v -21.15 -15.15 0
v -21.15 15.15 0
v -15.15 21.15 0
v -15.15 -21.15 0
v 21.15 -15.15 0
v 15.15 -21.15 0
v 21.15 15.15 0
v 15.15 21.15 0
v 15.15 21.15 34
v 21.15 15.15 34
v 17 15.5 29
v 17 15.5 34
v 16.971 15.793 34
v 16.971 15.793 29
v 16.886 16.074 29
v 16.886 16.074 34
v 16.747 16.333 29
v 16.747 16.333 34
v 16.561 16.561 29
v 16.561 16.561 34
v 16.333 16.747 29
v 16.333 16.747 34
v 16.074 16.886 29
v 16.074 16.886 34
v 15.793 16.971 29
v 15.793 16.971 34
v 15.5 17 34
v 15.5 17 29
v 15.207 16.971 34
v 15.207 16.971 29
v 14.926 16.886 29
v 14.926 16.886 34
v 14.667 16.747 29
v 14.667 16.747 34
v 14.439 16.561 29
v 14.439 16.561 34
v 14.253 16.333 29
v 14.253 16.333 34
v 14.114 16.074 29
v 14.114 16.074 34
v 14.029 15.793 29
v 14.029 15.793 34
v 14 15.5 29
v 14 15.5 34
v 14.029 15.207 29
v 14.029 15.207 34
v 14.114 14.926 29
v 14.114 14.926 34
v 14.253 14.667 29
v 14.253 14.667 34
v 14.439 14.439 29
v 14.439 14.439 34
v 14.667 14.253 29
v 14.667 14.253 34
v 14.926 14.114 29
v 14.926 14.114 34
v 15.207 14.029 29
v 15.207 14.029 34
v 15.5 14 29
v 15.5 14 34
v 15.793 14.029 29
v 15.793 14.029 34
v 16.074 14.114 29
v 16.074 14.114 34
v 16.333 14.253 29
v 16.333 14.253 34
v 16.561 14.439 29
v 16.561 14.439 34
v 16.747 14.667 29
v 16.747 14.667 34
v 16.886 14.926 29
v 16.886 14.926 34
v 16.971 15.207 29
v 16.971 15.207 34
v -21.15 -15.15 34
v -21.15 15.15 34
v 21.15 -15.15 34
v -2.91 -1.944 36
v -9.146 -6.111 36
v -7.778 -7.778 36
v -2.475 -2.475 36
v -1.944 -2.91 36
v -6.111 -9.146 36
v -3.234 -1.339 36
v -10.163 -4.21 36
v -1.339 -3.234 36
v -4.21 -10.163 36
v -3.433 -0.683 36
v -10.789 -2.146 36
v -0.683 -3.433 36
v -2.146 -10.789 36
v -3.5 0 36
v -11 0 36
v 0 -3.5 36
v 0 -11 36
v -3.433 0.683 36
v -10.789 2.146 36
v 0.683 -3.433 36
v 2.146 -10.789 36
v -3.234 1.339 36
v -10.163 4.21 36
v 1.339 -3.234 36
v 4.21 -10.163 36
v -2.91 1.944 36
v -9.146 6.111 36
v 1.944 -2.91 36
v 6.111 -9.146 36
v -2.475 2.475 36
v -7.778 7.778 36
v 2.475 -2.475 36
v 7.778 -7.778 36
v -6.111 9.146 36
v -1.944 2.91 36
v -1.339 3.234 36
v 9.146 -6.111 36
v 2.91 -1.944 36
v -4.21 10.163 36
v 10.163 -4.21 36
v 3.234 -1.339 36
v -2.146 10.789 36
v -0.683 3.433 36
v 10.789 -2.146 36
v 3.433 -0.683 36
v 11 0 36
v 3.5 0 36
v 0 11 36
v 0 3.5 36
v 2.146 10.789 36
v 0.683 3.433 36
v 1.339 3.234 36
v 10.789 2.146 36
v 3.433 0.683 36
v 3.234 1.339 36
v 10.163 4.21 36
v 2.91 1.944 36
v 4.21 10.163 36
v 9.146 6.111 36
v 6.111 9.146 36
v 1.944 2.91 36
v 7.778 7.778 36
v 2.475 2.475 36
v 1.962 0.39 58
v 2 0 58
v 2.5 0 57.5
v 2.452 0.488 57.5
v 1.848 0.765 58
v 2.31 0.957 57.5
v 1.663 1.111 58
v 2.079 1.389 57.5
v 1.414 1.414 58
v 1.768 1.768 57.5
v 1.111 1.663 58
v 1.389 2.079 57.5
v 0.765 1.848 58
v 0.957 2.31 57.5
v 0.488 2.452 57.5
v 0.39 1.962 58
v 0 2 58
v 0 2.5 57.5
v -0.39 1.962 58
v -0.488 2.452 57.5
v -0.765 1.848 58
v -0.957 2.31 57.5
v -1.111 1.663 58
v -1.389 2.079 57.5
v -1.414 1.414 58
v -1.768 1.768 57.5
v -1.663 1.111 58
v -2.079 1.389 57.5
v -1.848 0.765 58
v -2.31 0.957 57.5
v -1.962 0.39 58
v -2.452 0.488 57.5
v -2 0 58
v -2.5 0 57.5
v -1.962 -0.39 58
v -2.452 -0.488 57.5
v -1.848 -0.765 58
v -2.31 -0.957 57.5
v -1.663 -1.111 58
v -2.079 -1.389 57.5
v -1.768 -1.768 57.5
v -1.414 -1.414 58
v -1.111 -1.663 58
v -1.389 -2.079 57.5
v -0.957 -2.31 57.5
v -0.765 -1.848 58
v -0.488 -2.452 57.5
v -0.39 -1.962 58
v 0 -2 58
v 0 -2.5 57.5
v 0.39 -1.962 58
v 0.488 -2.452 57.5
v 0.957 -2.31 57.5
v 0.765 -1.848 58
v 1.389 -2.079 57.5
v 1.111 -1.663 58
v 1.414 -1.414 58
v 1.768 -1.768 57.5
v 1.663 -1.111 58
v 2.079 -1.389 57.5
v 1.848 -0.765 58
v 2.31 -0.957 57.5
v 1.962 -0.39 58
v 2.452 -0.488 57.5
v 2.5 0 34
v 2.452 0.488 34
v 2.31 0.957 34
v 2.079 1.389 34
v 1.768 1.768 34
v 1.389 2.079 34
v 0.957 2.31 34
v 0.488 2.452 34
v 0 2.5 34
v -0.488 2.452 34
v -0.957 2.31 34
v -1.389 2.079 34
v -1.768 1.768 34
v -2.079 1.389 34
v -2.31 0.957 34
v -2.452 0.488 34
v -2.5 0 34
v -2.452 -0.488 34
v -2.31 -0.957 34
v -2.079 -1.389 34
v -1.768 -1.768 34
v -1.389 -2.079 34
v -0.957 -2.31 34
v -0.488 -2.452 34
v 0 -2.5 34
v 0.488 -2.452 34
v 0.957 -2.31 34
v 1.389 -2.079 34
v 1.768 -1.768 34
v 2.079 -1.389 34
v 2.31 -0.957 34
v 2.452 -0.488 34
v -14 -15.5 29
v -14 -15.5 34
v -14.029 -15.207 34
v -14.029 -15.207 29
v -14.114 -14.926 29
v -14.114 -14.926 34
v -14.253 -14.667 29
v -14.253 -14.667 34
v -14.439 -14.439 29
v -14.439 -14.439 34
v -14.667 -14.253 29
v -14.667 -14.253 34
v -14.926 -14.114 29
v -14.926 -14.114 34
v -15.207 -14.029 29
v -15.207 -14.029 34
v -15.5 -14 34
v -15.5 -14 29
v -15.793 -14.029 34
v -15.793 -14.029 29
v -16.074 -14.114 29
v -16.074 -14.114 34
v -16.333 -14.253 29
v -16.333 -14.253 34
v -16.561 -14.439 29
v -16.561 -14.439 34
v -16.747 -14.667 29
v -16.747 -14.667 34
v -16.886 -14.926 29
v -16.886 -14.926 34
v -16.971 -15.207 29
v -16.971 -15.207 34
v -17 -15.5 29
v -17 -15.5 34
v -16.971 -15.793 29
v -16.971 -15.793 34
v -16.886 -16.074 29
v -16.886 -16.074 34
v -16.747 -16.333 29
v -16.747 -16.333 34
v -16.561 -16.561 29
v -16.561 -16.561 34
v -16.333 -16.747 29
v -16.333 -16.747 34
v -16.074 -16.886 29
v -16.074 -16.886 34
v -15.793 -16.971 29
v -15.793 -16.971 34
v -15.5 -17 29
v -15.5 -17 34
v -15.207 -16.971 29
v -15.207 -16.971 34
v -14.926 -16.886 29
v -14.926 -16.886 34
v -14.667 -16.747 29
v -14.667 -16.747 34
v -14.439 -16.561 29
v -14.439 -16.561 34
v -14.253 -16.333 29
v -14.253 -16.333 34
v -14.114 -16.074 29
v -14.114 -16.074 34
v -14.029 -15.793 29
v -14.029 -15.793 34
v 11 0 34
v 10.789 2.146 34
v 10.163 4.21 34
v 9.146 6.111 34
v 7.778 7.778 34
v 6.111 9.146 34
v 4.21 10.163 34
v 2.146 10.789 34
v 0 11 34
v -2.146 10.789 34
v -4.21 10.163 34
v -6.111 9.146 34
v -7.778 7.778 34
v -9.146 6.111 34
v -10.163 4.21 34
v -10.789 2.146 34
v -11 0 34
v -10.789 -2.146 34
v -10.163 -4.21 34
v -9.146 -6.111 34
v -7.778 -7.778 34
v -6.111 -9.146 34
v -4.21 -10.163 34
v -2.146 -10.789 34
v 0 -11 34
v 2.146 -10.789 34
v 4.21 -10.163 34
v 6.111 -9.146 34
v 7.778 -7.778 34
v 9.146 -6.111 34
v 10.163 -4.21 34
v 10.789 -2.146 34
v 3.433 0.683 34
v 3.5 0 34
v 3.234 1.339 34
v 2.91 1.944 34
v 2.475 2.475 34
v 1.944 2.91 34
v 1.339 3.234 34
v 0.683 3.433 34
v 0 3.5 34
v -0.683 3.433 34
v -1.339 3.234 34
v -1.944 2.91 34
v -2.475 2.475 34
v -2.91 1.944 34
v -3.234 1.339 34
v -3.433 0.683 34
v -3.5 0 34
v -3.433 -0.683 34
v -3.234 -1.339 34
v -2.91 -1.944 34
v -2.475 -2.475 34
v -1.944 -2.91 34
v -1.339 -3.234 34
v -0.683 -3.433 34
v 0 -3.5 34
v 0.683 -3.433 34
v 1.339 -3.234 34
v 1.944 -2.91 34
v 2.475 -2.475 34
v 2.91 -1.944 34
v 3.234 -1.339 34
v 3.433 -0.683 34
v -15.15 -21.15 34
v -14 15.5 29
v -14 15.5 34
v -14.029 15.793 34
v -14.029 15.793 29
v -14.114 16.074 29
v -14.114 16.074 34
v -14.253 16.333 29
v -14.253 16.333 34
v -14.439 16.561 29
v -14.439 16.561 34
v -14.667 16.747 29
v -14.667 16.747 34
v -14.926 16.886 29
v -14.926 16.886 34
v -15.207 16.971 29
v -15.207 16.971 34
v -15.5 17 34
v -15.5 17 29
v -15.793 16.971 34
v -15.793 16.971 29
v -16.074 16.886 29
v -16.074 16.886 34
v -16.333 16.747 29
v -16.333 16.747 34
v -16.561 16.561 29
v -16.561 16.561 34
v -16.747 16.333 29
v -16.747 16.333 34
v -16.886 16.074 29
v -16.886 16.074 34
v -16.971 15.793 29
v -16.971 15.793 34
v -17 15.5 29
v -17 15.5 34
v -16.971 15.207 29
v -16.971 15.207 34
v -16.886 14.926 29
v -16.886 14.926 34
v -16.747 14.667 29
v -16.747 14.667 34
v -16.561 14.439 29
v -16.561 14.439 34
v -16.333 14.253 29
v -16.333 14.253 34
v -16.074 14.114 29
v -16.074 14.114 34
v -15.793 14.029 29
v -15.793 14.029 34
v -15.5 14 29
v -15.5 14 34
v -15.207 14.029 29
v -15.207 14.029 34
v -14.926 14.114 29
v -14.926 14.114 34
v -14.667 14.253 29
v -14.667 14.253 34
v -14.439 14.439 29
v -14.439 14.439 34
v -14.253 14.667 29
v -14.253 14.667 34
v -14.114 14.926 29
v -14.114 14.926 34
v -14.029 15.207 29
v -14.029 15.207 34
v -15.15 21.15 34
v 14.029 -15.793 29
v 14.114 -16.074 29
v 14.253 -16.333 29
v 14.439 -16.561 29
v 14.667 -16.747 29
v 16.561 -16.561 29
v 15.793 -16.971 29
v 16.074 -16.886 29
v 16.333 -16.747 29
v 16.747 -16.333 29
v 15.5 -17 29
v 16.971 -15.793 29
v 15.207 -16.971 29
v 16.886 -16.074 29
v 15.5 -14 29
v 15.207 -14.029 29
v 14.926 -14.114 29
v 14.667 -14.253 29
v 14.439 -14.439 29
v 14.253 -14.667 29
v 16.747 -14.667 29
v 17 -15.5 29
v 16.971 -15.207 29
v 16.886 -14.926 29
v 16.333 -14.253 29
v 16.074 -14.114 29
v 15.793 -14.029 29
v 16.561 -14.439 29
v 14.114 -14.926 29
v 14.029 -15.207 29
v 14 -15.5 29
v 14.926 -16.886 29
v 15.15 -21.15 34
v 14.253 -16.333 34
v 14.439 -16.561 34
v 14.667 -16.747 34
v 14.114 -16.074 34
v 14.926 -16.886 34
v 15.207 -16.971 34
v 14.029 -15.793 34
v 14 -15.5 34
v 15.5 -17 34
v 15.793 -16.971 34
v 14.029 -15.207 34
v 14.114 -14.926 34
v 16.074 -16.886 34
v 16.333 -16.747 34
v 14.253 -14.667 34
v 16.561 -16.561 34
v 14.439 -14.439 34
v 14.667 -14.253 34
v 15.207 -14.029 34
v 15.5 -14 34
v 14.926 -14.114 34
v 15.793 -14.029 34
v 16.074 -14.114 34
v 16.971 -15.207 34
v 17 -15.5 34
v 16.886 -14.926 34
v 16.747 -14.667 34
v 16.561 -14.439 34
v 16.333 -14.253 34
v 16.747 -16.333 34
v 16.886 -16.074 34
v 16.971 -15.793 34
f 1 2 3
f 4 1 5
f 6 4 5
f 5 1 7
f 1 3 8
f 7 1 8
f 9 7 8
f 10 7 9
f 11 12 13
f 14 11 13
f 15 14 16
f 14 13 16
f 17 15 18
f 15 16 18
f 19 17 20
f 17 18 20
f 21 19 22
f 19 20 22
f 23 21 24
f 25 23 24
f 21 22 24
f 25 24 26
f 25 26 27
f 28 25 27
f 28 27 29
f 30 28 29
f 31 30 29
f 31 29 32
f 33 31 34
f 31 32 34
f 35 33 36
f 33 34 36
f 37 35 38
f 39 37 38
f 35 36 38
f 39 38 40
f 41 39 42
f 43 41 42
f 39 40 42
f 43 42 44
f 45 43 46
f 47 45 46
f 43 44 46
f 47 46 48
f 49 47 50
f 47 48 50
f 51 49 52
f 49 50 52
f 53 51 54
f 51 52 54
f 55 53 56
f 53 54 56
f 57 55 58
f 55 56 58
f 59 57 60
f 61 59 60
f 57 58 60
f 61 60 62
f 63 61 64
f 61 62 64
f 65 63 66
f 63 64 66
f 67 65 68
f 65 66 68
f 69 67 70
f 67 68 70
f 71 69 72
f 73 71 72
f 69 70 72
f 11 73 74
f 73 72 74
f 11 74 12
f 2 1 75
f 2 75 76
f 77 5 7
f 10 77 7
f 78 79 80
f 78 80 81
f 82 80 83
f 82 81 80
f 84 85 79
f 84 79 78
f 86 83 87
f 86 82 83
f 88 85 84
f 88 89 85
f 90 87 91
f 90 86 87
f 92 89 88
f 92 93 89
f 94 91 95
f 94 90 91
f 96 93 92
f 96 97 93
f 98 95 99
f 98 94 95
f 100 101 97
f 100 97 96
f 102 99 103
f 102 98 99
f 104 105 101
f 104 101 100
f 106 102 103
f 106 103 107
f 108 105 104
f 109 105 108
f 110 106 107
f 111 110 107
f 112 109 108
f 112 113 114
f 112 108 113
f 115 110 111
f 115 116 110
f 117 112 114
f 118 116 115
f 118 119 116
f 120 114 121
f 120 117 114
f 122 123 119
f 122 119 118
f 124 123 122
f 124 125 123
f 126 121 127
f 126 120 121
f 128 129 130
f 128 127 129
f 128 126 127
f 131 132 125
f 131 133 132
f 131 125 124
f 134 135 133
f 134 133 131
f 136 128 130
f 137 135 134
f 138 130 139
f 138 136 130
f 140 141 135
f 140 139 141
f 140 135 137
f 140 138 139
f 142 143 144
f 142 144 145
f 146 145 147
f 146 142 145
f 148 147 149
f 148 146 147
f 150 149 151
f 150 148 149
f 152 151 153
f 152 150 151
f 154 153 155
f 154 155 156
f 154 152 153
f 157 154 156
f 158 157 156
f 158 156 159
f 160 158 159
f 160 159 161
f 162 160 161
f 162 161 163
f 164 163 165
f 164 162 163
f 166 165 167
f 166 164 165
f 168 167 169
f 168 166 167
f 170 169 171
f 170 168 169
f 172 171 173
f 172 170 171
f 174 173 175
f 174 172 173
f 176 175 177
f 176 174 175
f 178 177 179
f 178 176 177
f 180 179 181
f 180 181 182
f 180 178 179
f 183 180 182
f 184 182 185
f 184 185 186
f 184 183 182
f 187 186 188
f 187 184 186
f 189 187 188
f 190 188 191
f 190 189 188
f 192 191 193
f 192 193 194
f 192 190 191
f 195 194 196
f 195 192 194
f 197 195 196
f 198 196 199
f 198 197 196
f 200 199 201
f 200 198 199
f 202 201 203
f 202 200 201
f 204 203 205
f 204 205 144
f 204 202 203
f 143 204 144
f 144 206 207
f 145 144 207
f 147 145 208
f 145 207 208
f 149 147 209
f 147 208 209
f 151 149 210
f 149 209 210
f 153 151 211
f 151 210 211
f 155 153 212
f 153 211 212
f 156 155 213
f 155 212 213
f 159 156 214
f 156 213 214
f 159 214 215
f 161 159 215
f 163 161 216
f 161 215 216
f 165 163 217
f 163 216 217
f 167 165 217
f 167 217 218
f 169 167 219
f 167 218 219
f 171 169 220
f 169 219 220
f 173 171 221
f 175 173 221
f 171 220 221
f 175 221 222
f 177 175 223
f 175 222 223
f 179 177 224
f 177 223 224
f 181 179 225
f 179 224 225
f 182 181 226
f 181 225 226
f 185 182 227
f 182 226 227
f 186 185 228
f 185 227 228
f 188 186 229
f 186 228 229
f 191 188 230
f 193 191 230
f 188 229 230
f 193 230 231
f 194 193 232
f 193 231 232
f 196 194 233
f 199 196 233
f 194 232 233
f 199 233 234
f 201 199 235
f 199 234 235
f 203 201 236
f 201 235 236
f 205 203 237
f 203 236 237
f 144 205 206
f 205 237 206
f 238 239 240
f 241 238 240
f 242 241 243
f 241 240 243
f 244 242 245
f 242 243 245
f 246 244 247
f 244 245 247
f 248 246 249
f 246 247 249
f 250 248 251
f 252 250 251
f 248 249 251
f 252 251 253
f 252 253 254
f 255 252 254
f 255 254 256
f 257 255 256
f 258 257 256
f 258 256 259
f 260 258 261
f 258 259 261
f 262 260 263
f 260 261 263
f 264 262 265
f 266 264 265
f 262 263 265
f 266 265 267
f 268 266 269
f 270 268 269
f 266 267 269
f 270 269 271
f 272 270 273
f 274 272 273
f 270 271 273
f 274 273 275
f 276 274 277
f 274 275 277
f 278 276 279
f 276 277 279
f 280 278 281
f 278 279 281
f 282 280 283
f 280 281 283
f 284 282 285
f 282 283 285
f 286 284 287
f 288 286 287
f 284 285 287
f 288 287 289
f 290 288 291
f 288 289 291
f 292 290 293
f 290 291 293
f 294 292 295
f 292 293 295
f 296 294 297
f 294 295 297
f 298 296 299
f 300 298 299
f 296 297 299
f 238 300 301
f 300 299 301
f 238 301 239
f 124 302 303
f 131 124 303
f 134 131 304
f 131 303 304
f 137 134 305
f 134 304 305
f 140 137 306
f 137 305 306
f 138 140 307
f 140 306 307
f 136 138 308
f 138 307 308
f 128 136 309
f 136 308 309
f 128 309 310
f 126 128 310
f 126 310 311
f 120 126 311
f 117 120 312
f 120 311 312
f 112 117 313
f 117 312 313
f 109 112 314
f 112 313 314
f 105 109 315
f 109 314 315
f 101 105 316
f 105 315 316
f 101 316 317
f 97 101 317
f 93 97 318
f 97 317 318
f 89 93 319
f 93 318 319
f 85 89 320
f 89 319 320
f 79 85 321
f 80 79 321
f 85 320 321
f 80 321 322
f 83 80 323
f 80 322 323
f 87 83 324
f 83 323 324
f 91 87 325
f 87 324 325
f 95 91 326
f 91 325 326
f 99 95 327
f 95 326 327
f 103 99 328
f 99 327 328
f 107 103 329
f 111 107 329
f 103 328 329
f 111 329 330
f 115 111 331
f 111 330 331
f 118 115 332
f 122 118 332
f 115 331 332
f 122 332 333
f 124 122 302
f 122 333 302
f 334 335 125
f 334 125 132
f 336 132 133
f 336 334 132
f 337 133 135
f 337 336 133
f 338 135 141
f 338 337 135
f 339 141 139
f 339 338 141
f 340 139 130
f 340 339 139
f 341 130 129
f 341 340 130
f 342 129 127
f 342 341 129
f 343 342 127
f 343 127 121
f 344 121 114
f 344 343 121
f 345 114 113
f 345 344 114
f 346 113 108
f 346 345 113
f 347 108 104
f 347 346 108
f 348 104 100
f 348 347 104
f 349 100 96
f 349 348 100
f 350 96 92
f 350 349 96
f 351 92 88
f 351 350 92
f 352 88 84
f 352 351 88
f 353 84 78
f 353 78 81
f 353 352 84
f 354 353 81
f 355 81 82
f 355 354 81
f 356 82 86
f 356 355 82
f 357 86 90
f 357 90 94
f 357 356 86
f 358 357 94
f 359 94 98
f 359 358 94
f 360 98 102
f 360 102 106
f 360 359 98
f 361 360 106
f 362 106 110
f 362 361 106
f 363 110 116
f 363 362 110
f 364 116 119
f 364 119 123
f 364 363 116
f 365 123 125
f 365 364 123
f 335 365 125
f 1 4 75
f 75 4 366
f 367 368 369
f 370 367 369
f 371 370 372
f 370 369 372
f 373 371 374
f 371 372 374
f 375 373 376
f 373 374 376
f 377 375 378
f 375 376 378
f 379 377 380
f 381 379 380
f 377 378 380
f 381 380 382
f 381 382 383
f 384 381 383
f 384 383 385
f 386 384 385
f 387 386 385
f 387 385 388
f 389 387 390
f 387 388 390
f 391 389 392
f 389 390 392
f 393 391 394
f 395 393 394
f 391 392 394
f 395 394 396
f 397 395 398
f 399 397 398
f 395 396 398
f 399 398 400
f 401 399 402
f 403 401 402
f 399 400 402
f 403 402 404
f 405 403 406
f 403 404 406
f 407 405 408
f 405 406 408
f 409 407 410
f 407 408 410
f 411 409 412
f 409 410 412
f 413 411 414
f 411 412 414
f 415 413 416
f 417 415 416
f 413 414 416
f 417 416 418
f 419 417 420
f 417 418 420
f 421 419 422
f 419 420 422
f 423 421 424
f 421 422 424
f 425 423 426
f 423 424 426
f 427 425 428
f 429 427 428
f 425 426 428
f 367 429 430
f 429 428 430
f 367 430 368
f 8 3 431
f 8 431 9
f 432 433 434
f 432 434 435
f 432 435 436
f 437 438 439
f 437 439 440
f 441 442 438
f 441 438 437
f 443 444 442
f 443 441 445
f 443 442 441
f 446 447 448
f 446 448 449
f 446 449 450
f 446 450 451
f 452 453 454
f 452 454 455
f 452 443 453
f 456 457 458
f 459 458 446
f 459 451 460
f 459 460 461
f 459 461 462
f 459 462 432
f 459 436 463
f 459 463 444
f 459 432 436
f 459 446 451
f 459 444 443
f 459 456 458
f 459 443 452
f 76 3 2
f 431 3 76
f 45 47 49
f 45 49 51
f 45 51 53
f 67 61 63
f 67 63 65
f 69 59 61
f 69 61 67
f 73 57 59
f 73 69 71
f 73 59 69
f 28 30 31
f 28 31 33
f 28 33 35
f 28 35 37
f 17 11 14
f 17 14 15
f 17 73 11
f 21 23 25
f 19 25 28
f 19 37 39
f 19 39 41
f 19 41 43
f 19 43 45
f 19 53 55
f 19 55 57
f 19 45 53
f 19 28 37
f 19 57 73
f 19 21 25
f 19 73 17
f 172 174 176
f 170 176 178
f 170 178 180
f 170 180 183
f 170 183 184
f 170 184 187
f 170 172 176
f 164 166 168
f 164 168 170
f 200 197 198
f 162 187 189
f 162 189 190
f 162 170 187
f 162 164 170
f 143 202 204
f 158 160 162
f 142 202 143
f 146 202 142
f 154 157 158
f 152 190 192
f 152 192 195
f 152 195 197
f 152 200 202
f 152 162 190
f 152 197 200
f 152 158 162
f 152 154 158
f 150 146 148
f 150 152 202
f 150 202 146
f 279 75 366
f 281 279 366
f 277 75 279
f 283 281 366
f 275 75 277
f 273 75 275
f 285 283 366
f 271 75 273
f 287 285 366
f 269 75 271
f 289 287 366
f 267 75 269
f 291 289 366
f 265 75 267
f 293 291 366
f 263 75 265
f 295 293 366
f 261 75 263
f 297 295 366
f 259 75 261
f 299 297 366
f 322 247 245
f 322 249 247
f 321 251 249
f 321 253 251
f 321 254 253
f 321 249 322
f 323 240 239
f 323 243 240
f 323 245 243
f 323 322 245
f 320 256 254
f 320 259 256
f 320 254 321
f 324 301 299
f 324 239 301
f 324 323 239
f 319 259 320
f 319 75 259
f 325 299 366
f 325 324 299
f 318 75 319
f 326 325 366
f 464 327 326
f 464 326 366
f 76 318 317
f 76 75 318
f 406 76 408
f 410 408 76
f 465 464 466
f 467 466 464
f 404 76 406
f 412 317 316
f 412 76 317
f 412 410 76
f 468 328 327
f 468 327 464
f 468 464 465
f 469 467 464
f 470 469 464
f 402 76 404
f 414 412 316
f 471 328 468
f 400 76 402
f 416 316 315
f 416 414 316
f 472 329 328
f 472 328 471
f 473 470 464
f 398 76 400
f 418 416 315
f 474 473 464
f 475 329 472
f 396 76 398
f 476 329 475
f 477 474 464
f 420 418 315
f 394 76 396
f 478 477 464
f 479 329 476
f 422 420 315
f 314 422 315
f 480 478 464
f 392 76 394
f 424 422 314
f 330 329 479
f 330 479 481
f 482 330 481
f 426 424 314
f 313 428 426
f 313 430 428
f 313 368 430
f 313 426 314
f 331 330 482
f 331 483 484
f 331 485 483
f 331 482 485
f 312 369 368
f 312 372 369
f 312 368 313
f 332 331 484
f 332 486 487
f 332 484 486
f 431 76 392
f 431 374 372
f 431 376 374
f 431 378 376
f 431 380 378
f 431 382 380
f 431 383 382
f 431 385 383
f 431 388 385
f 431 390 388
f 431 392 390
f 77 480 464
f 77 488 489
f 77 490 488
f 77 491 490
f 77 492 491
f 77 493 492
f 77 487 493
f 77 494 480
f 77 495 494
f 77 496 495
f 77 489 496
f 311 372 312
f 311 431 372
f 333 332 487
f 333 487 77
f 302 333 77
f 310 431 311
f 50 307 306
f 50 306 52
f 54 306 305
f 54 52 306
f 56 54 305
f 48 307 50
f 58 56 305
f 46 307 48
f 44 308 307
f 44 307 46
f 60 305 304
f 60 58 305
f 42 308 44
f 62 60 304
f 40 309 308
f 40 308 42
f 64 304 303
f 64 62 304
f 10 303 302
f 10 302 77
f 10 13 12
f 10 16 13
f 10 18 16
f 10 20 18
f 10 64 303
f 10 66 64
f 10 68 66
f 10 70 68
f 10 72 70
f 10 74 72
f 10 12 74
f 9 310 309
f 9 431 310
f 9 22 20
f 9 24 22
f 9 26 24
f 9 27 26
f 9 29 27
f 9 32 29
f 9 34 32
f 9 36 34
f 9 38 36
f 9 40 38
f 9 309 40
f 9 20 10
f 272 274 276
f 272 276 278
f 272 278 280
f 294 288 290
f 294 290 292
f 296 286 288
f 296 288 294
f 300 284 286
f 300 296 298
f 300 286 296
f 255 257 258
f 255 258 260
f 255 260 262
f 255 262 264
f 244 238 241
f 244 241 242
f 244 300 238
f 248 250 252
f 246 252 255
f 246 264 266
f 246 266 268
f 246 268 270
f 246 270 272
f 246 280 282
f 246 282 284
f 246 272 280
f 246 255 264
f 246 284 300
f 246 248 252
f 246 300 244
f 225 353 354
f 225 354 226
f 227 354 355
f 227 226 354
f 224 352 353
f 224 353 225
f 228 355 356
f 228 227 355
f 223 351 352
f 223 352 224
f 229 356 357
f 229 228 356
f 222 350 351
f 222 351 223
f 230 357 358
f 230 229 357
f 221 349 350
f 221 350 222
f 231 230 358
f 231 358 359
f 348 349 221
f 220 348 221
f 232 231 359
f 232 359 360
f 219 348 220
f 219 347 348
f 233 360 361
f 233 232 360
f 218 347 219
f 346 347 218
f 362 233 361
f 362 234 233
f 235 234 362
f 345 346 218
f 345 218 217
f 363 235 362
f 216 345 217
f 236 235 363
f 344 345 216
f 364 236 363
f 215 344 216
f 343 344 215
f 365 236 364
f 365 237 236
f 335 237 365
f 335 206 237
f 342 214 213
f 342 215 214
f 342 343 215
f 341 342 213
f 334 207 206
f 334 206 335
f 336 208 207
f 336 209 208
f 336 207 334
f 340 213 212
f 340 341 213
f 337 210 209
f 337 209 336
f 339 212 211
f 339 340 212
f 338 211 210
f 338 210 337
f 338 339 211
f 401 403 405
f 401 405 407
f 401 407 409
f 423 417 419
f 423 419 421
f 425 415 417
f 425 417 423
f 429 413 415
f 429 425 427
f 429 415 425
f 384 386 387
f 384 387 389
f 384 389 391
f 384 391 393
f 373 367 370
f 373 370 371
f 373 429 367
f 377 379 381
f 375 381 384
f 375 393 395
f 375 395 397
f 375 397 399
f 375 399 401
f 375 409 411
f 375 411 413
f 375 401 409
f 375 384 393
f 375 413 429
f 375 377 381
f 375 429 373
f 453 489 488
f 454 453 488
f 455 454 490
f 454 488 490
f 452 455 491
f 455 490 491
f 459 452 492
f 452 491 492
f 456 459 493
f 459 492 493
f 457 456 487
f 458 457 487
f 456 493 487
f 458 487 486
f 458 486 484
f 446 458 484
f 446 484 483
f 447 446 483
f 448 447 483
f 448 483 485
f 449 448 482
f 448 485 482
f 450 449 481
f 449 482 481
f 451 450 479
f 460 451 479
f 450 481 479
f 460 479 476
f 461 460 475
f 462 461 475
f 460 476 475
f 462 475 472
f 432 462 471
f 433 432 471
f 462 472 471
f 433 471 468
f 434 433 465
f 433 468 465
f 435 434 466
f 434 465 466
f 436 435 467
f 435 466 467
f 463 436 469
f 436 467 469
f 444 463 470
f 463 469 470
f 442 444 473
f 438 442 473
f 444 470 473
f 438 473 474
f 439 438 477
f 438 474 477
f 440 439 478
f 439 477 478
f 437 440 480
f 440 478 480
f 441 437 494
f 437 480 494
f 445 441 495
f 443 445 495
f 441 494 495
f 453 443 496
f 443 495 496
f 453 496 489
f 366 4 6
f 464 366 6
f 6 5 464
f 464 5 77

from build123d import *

# Parameters (mm, degrees)
F0_W     = 42.3
F0_H     = 42.3
F1_DEPTH = 34
F2_R     = 11
F2_R_2   = 3.5
F3_DEPTH = 2
F4_R     = 2.5
F5_DEPTH = 24
F6_SIZE  = 0.5
F7_R     = 1.5
F8_DEPTH = 5
F9_SIZE  = 6


with BuildPart() as f1:
    # F0 (on Top) → F1 (new body)
    with BuildSketch(Plane.XY):
        Rectangle(F0_W, F0_H)
    extrude(amount=F1_DEPTH)

    # F2 (on face) → F3 (join)
    with BuildSketch(Plane.XY.offset(34)):
        Circle(F2_R)
        Circle(F2_R_2, mode=Mode.SUBTRACT)
    extrude(amount=F3_DEPTH)

    # F4 (on face) → F5 (join)
    with BuildSketch(Plane.XY.offset(34)):
        Circle(F4_R)
    extrude(amount=F5_DEPTH)

    # F6
    f6_edges = [f1.edges().sort_by_distance(p)[0] for p in [
        (-2.5, 0, 58),
    ]]
    chamfer(f6_edges, length=F6_SIZE)

    # F7 (on face) → F8 (cut)
    with BuildSketch(Plane.XY.offset(34)):
        with Locations((-15.5, 15.5)):
            Circle(F7_R)
        with Locations((-15.5, -15.5)):
            Circle(F7_R)
        with Locations((15.5, 15.5)):
            Circle(F7_R)
        with Locations((15.5, -15.5)):
            Circle(F7_R)
    extrude(amount=-F8_DEPTH, mode=Mode.SUBTRACT)

    # F9
    f9_edges = [f1.edges().sort_by_distance(p)[0] for p in [
        (21.15, -21.15, 17),
        (-21.15, -21.15, 17),
        (21.15, 21.15, 17),
        (-21.15, 21.15, 17),
    ]]
    chamfer(f9_edges, length=F9_SIZE)


solid = f1.part
